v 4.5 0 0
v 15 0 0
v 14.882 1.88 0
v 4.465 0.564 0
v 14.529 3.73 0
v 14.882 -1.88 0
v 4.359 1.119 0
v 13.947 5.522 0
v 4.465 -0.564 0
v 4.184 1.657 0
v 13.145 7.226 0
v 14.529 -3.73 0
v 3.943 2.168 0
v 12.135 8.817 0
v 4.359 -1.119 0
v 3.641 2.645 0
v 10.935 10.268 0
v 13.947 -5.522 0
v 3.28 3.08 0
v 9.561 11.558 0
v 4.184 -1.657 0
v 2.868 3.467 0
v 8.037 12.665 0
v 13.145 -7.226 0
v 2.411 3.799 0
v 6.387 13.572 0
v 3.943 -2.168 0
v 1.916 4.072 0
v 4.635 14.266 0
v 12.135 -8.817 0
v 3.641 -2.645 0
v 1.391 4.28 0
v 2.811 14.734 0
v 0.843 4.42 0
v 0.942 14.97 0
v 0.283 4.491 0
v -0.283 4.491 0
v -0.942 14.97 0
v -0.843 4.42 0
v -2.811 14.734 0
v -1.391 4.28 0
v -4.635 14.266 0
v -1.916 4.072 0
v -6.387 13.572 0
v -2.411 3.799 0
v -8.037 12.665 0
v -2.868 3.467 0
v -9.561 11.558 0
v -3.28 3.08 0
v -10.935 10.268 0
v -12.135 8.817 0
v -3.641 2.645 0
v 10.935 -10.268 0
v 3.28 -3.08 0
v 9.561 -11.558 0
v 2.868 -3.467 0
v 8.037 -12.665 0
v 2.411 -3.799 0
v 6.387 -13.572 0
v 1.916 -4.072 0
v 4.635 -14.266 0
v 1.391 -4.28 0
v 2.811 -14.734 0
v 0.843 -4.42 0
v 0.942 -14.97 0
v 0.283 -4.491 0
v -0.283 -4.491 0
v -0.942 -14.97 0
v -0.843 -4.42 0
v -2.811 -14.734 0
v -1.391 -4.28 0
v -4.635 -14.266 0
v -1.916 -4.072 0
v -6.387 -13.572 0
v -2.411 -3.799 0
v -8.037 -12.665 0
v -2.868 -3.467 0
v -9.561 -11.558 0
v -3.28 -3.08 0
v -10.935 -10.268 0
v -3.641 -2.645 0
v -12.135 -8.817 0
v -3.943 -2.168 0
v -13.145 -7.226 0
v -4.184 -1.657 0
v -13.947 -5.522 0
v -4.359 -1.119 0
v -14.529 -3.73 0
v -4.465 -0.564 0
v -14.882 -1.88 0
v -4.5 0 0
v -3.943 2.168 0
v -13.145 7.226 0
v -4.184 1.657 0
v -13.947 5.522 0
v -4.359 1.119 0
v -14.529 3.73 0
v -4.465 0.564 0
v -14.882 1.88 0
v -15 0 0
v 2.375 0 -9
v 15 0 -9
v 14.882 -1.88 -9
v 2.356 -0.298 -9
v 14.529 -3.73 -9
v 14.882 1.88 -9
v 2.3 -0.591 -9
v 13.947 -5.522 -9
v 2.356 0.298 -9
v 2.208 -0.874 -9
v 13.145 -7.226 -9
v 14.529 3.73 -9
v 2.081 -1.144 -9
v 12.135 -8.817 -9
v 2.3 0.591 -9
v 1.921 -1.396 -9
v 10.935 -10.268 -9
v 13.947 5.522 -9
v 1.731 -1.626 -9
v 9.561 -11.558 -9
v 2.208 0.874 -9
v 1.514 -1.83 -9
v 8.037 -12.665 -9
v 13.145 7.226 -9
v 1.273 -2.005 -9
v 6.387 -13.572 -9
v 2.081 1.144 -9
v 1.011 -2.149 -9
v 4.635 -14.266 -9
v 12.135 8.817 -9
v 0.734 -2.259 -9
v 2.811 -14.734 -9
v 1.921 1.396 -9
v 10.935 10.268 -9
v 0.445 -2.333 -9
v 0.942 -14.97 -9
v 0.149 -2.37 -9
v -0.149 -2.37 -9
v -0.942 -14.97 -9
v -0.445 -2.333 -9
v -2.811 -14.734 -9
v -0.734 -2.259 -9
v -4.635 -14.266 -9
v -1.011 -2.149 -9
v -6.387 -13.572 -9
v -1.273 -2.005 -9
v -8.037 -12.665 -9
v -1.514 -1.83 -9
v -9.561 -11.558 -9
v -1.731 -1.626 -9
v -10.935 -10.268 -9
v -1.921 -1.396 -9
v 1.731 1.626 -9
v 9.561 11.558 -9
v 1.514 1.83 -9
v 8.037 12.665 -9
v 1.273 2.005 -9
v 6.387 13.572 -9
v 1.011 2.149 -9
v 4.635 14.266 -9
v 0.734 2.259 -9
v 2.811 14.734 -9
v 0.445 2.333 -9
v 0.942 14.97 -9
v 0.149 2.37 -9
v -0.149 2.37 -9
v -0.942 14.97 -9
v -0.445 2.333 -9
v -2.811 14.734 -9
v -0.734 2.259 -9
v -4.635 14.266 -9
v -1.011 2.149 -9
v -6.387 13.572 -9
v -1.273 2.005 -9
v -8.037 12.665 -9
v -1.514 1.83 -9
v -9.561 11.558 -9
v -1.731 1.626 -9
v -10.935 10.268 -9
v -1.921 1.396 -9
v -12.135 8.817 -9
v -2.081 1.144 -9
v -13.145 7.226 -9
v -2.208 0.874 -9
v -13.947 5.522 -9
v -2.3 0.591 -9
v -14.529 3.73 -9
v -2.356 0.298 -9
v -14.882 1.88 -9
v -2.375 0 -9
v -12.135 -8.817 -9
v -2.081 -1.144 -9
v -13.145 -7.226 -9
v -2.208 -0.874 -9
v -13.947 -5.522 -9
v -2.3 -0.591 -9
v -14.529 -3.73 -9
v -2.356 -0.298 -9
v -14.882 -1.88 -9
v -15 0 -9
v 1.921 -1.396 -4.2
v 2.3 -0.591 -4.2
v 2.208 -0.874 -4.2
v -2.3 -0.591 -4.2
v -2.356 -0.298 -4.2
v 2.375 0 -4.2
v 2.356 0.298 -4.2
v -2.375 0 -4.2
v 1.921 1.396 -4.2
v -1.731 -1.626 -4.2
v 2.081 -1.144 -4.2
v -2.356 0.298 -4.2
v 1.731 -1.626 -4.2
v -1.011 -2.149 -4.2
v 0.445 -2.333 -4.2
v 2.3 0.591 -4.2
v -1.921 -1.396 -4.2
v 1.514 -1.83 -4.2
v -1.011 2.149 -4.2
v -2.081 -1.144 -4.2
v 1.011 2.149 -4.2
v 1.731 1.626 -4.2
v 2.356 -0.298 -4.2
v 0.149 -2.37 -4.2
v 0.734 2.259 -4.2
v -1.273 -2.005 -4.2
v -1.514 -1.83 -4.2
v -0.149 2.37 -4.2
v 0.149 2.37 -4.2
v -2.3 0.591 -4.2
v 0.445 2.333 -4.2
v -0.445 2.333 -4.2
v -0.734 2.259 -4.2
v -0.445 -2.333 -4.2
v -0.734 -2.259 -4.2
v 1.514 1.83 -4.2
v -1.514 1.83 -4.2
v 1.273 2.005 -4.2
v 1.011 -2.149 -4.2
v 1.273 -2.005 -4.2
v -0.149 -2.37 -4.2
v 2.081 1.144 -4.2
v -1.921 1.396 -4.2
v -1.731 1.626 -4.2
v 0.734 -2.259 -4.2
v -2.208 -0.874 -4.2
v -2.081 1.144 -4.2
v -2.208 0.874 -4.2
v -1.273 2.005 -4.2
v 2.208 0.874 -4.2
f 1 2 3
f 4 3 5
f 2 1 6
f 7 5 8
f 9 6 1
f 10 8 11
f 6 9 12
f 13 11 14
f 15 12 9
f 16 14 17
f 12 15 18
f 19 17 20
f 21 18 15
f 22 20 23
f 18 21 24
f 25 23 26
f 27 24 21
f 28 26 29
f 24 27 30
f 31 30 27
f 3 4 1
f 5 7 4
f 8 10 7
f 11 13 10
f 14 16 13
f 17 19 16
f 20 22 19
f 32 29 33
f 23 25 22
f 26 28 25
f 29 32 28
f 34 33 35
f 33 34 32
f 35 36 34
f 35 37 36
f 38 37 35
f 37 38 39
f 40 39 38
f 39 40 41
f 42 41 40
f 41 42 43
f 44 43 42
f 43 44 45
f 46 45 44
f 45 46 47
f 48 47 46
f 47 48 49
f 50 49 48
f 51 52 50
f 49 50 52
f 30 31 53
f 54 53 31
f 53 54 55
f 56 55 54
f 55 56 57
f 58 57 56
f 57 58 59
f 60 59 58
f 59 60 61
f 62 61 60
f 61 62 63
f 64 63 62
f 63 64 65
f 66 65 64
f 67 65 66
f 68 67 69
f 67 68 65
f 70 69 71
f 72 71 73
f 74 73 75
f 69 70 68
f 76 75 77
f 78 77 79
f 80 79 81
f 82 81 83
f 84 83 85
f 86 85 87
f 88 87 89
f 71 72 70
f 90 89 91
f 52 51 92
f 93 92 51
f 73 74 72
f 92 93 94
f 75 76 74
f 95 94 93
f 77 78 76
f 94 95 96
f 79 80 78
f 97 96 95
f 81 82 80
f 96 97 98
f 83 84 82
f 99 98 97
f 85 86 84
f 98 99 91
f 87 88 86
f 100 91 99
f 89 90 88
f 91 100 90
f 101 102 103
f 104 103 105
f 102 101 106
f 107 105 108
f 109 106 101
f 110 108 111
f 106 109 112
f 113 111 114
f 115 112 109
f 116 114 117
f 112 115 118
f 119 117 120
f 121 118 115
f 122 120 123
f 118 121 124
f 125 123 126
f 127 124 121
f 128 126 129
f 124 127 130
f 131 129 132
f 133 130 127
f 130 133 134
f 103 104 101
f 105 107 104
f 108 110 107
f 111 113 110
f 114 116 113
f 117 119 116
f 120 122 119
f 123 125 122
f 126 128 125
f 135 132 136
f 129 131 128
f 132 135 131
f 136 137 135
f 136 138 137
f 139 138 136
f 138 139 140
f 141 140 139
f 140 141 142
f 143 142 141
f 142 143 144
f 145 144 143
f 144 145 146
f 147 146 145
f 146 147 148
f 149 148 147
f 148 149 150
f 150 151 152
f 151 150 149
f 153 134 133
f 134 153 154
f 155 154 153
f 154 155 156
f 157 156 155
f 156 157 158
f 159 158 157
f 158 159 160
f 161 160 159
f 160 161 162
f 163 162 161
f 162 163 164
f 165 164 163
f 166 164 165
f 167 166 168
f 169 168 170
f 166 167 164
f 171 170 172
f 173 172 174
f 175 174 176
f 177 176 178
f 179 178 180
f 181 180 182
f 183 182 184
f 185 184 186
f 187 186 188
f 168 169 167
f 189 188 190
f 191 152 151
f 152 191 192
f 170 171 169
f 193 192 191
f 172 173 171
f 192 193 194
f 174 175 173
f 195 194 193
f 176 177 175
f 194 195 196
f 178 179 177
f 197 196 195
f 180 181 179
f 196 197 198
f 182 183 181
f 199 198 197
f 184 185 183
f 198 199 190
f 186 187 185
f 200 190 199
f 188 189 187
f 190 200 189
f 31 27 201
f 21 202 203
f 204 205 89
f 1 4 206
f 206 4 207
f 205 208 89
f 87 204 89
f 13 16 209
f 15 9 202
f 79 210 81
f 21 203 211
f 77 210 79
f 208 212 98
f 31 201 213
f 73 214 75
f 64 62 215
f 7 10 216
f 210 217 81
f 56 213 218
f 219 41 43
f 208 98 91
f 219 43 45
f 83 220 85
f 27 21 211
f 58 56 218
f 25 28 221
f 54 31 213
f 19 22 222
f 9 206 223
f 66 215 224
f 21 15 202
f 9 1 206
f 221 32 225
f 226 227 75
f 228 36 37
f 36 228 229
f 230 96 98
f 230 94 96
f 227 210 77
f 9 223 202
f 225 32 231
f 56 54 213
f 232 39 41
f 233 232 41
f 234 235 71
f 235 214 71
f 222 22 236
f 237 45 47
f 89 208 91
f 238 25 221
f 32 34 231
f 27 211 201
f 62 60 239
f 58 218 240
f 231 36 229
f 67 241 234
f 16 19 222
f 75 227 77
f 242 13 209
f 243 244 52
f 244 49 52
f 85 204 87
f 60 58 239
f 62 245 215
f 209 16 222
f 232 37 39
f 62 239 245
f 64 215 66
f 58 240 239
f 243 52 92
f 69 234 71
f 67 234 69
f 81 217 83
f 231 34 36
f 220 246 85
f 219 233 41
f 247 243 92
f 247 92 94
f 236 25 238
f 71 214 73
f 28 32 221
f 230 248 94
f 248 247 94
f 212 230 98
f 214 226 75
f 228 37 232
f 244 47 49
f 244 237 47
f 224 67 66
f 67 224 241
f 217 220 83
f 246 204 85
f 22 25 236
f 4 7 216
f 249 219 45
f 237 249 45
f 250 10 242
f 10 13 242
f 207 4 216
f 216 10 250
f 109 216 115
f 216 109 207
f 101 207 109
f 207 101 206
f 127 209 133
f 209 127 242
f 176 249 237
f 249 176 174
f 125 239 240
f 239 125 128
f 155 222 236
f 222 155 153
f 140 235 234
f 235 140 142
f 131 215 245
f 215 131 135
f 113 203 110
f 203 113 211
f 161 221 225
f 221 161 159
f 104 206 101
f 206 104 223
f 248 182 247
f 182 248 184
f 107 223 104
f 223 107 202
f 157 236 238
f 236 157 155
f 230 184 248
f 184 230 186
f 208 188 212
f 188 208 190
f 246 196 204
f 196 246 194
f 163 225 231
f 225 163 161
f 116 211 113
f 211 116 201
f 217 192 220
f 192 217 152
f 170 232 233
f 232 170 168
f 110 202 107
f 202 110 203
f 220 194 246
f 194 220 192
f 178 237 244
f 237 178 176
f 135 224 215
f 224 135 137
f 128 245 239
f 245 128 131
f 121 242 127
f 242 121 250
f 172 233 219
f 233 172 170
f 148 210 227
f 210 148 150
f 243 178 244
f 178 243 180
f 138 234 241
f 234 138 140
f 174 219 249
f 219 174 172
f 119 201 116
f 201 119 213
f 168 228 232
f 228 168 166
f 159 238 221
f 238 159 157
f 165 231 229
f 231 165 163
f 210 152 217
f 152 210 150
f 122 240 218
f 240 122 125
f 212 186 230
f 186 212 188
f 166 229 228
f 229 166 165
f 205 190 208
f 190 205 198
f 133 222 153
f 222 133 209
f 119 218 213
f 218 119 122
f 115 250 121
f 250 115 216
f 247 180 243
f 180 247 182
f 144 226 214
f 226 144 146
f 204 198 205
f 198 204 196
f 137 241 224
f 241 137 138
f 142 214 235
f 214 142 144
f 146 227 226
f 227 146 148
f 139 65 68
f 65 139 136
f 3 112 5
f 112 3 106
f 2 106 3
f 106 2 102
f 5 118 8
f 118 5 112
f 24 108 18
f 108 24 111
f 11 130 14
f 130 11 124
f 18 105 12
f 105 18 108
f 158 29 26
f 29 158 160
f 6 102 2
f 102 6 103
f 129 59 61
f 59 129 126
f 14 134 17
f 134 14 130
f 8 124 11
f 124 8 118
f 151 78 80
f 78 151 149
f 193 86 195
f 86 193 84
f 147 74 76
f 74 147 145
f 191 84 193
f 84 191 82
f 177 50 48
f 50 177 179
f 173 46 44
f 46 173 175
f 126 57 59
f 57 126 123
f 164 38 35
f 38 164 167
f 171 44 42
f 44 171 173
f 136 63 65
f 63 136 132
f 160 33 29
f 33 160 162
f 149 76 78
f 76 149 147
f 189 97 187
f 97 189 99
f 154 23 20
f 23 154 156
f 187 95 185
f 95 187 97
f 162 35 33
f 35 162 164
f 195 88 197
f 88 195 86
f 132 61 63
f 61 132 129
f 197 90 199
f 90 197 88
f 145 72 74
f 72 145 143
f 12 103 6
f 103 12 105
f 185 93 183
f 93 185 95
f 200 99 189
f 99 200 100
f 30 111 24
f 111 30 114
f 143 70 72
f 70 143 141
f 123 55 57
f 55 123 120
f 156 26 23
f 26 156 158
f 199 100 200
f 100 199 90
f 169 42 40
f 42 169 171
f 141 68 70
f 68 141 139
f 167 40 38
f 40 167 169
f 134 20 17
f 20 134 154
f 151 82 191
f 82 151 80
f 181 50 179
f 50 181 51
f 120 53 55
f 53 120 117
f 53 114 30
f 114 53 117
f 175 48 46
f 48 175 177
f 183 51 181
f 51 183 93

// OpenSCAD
$fn = 50;


difference() {
	union() {
		translate(v = [0, 0, -9.0000000000]) {
			cylinder(h = 9, r = 15.0000000000);
		}
	}
	union() {
		translate(v = [0, 0, 0]) {
			rotate(a = [0, 0, 0]) {
				difference() {
					union() {
						translate(v = [0, 0, -9.0000000000]) {
							cylinder(h = 9, r = 2.2500000000);
						}
						translate(v = [0, 0, -4.2000000000]) {
							cylinder(h = 4.2000000000, r1 = 2.3750000000, r2 = 4.5000000000);
						}
						translate(v = [0, 0, -9.0000000000]) {
							cylinder(h = 9, r = 2.3750000000);
						}
						translate(v = [0, 0, -9.0000000000]) {
							cylinder(h = 9, r = 2.2500000000);
						}
					}
					union();
				}
			}
		}
	}
}
